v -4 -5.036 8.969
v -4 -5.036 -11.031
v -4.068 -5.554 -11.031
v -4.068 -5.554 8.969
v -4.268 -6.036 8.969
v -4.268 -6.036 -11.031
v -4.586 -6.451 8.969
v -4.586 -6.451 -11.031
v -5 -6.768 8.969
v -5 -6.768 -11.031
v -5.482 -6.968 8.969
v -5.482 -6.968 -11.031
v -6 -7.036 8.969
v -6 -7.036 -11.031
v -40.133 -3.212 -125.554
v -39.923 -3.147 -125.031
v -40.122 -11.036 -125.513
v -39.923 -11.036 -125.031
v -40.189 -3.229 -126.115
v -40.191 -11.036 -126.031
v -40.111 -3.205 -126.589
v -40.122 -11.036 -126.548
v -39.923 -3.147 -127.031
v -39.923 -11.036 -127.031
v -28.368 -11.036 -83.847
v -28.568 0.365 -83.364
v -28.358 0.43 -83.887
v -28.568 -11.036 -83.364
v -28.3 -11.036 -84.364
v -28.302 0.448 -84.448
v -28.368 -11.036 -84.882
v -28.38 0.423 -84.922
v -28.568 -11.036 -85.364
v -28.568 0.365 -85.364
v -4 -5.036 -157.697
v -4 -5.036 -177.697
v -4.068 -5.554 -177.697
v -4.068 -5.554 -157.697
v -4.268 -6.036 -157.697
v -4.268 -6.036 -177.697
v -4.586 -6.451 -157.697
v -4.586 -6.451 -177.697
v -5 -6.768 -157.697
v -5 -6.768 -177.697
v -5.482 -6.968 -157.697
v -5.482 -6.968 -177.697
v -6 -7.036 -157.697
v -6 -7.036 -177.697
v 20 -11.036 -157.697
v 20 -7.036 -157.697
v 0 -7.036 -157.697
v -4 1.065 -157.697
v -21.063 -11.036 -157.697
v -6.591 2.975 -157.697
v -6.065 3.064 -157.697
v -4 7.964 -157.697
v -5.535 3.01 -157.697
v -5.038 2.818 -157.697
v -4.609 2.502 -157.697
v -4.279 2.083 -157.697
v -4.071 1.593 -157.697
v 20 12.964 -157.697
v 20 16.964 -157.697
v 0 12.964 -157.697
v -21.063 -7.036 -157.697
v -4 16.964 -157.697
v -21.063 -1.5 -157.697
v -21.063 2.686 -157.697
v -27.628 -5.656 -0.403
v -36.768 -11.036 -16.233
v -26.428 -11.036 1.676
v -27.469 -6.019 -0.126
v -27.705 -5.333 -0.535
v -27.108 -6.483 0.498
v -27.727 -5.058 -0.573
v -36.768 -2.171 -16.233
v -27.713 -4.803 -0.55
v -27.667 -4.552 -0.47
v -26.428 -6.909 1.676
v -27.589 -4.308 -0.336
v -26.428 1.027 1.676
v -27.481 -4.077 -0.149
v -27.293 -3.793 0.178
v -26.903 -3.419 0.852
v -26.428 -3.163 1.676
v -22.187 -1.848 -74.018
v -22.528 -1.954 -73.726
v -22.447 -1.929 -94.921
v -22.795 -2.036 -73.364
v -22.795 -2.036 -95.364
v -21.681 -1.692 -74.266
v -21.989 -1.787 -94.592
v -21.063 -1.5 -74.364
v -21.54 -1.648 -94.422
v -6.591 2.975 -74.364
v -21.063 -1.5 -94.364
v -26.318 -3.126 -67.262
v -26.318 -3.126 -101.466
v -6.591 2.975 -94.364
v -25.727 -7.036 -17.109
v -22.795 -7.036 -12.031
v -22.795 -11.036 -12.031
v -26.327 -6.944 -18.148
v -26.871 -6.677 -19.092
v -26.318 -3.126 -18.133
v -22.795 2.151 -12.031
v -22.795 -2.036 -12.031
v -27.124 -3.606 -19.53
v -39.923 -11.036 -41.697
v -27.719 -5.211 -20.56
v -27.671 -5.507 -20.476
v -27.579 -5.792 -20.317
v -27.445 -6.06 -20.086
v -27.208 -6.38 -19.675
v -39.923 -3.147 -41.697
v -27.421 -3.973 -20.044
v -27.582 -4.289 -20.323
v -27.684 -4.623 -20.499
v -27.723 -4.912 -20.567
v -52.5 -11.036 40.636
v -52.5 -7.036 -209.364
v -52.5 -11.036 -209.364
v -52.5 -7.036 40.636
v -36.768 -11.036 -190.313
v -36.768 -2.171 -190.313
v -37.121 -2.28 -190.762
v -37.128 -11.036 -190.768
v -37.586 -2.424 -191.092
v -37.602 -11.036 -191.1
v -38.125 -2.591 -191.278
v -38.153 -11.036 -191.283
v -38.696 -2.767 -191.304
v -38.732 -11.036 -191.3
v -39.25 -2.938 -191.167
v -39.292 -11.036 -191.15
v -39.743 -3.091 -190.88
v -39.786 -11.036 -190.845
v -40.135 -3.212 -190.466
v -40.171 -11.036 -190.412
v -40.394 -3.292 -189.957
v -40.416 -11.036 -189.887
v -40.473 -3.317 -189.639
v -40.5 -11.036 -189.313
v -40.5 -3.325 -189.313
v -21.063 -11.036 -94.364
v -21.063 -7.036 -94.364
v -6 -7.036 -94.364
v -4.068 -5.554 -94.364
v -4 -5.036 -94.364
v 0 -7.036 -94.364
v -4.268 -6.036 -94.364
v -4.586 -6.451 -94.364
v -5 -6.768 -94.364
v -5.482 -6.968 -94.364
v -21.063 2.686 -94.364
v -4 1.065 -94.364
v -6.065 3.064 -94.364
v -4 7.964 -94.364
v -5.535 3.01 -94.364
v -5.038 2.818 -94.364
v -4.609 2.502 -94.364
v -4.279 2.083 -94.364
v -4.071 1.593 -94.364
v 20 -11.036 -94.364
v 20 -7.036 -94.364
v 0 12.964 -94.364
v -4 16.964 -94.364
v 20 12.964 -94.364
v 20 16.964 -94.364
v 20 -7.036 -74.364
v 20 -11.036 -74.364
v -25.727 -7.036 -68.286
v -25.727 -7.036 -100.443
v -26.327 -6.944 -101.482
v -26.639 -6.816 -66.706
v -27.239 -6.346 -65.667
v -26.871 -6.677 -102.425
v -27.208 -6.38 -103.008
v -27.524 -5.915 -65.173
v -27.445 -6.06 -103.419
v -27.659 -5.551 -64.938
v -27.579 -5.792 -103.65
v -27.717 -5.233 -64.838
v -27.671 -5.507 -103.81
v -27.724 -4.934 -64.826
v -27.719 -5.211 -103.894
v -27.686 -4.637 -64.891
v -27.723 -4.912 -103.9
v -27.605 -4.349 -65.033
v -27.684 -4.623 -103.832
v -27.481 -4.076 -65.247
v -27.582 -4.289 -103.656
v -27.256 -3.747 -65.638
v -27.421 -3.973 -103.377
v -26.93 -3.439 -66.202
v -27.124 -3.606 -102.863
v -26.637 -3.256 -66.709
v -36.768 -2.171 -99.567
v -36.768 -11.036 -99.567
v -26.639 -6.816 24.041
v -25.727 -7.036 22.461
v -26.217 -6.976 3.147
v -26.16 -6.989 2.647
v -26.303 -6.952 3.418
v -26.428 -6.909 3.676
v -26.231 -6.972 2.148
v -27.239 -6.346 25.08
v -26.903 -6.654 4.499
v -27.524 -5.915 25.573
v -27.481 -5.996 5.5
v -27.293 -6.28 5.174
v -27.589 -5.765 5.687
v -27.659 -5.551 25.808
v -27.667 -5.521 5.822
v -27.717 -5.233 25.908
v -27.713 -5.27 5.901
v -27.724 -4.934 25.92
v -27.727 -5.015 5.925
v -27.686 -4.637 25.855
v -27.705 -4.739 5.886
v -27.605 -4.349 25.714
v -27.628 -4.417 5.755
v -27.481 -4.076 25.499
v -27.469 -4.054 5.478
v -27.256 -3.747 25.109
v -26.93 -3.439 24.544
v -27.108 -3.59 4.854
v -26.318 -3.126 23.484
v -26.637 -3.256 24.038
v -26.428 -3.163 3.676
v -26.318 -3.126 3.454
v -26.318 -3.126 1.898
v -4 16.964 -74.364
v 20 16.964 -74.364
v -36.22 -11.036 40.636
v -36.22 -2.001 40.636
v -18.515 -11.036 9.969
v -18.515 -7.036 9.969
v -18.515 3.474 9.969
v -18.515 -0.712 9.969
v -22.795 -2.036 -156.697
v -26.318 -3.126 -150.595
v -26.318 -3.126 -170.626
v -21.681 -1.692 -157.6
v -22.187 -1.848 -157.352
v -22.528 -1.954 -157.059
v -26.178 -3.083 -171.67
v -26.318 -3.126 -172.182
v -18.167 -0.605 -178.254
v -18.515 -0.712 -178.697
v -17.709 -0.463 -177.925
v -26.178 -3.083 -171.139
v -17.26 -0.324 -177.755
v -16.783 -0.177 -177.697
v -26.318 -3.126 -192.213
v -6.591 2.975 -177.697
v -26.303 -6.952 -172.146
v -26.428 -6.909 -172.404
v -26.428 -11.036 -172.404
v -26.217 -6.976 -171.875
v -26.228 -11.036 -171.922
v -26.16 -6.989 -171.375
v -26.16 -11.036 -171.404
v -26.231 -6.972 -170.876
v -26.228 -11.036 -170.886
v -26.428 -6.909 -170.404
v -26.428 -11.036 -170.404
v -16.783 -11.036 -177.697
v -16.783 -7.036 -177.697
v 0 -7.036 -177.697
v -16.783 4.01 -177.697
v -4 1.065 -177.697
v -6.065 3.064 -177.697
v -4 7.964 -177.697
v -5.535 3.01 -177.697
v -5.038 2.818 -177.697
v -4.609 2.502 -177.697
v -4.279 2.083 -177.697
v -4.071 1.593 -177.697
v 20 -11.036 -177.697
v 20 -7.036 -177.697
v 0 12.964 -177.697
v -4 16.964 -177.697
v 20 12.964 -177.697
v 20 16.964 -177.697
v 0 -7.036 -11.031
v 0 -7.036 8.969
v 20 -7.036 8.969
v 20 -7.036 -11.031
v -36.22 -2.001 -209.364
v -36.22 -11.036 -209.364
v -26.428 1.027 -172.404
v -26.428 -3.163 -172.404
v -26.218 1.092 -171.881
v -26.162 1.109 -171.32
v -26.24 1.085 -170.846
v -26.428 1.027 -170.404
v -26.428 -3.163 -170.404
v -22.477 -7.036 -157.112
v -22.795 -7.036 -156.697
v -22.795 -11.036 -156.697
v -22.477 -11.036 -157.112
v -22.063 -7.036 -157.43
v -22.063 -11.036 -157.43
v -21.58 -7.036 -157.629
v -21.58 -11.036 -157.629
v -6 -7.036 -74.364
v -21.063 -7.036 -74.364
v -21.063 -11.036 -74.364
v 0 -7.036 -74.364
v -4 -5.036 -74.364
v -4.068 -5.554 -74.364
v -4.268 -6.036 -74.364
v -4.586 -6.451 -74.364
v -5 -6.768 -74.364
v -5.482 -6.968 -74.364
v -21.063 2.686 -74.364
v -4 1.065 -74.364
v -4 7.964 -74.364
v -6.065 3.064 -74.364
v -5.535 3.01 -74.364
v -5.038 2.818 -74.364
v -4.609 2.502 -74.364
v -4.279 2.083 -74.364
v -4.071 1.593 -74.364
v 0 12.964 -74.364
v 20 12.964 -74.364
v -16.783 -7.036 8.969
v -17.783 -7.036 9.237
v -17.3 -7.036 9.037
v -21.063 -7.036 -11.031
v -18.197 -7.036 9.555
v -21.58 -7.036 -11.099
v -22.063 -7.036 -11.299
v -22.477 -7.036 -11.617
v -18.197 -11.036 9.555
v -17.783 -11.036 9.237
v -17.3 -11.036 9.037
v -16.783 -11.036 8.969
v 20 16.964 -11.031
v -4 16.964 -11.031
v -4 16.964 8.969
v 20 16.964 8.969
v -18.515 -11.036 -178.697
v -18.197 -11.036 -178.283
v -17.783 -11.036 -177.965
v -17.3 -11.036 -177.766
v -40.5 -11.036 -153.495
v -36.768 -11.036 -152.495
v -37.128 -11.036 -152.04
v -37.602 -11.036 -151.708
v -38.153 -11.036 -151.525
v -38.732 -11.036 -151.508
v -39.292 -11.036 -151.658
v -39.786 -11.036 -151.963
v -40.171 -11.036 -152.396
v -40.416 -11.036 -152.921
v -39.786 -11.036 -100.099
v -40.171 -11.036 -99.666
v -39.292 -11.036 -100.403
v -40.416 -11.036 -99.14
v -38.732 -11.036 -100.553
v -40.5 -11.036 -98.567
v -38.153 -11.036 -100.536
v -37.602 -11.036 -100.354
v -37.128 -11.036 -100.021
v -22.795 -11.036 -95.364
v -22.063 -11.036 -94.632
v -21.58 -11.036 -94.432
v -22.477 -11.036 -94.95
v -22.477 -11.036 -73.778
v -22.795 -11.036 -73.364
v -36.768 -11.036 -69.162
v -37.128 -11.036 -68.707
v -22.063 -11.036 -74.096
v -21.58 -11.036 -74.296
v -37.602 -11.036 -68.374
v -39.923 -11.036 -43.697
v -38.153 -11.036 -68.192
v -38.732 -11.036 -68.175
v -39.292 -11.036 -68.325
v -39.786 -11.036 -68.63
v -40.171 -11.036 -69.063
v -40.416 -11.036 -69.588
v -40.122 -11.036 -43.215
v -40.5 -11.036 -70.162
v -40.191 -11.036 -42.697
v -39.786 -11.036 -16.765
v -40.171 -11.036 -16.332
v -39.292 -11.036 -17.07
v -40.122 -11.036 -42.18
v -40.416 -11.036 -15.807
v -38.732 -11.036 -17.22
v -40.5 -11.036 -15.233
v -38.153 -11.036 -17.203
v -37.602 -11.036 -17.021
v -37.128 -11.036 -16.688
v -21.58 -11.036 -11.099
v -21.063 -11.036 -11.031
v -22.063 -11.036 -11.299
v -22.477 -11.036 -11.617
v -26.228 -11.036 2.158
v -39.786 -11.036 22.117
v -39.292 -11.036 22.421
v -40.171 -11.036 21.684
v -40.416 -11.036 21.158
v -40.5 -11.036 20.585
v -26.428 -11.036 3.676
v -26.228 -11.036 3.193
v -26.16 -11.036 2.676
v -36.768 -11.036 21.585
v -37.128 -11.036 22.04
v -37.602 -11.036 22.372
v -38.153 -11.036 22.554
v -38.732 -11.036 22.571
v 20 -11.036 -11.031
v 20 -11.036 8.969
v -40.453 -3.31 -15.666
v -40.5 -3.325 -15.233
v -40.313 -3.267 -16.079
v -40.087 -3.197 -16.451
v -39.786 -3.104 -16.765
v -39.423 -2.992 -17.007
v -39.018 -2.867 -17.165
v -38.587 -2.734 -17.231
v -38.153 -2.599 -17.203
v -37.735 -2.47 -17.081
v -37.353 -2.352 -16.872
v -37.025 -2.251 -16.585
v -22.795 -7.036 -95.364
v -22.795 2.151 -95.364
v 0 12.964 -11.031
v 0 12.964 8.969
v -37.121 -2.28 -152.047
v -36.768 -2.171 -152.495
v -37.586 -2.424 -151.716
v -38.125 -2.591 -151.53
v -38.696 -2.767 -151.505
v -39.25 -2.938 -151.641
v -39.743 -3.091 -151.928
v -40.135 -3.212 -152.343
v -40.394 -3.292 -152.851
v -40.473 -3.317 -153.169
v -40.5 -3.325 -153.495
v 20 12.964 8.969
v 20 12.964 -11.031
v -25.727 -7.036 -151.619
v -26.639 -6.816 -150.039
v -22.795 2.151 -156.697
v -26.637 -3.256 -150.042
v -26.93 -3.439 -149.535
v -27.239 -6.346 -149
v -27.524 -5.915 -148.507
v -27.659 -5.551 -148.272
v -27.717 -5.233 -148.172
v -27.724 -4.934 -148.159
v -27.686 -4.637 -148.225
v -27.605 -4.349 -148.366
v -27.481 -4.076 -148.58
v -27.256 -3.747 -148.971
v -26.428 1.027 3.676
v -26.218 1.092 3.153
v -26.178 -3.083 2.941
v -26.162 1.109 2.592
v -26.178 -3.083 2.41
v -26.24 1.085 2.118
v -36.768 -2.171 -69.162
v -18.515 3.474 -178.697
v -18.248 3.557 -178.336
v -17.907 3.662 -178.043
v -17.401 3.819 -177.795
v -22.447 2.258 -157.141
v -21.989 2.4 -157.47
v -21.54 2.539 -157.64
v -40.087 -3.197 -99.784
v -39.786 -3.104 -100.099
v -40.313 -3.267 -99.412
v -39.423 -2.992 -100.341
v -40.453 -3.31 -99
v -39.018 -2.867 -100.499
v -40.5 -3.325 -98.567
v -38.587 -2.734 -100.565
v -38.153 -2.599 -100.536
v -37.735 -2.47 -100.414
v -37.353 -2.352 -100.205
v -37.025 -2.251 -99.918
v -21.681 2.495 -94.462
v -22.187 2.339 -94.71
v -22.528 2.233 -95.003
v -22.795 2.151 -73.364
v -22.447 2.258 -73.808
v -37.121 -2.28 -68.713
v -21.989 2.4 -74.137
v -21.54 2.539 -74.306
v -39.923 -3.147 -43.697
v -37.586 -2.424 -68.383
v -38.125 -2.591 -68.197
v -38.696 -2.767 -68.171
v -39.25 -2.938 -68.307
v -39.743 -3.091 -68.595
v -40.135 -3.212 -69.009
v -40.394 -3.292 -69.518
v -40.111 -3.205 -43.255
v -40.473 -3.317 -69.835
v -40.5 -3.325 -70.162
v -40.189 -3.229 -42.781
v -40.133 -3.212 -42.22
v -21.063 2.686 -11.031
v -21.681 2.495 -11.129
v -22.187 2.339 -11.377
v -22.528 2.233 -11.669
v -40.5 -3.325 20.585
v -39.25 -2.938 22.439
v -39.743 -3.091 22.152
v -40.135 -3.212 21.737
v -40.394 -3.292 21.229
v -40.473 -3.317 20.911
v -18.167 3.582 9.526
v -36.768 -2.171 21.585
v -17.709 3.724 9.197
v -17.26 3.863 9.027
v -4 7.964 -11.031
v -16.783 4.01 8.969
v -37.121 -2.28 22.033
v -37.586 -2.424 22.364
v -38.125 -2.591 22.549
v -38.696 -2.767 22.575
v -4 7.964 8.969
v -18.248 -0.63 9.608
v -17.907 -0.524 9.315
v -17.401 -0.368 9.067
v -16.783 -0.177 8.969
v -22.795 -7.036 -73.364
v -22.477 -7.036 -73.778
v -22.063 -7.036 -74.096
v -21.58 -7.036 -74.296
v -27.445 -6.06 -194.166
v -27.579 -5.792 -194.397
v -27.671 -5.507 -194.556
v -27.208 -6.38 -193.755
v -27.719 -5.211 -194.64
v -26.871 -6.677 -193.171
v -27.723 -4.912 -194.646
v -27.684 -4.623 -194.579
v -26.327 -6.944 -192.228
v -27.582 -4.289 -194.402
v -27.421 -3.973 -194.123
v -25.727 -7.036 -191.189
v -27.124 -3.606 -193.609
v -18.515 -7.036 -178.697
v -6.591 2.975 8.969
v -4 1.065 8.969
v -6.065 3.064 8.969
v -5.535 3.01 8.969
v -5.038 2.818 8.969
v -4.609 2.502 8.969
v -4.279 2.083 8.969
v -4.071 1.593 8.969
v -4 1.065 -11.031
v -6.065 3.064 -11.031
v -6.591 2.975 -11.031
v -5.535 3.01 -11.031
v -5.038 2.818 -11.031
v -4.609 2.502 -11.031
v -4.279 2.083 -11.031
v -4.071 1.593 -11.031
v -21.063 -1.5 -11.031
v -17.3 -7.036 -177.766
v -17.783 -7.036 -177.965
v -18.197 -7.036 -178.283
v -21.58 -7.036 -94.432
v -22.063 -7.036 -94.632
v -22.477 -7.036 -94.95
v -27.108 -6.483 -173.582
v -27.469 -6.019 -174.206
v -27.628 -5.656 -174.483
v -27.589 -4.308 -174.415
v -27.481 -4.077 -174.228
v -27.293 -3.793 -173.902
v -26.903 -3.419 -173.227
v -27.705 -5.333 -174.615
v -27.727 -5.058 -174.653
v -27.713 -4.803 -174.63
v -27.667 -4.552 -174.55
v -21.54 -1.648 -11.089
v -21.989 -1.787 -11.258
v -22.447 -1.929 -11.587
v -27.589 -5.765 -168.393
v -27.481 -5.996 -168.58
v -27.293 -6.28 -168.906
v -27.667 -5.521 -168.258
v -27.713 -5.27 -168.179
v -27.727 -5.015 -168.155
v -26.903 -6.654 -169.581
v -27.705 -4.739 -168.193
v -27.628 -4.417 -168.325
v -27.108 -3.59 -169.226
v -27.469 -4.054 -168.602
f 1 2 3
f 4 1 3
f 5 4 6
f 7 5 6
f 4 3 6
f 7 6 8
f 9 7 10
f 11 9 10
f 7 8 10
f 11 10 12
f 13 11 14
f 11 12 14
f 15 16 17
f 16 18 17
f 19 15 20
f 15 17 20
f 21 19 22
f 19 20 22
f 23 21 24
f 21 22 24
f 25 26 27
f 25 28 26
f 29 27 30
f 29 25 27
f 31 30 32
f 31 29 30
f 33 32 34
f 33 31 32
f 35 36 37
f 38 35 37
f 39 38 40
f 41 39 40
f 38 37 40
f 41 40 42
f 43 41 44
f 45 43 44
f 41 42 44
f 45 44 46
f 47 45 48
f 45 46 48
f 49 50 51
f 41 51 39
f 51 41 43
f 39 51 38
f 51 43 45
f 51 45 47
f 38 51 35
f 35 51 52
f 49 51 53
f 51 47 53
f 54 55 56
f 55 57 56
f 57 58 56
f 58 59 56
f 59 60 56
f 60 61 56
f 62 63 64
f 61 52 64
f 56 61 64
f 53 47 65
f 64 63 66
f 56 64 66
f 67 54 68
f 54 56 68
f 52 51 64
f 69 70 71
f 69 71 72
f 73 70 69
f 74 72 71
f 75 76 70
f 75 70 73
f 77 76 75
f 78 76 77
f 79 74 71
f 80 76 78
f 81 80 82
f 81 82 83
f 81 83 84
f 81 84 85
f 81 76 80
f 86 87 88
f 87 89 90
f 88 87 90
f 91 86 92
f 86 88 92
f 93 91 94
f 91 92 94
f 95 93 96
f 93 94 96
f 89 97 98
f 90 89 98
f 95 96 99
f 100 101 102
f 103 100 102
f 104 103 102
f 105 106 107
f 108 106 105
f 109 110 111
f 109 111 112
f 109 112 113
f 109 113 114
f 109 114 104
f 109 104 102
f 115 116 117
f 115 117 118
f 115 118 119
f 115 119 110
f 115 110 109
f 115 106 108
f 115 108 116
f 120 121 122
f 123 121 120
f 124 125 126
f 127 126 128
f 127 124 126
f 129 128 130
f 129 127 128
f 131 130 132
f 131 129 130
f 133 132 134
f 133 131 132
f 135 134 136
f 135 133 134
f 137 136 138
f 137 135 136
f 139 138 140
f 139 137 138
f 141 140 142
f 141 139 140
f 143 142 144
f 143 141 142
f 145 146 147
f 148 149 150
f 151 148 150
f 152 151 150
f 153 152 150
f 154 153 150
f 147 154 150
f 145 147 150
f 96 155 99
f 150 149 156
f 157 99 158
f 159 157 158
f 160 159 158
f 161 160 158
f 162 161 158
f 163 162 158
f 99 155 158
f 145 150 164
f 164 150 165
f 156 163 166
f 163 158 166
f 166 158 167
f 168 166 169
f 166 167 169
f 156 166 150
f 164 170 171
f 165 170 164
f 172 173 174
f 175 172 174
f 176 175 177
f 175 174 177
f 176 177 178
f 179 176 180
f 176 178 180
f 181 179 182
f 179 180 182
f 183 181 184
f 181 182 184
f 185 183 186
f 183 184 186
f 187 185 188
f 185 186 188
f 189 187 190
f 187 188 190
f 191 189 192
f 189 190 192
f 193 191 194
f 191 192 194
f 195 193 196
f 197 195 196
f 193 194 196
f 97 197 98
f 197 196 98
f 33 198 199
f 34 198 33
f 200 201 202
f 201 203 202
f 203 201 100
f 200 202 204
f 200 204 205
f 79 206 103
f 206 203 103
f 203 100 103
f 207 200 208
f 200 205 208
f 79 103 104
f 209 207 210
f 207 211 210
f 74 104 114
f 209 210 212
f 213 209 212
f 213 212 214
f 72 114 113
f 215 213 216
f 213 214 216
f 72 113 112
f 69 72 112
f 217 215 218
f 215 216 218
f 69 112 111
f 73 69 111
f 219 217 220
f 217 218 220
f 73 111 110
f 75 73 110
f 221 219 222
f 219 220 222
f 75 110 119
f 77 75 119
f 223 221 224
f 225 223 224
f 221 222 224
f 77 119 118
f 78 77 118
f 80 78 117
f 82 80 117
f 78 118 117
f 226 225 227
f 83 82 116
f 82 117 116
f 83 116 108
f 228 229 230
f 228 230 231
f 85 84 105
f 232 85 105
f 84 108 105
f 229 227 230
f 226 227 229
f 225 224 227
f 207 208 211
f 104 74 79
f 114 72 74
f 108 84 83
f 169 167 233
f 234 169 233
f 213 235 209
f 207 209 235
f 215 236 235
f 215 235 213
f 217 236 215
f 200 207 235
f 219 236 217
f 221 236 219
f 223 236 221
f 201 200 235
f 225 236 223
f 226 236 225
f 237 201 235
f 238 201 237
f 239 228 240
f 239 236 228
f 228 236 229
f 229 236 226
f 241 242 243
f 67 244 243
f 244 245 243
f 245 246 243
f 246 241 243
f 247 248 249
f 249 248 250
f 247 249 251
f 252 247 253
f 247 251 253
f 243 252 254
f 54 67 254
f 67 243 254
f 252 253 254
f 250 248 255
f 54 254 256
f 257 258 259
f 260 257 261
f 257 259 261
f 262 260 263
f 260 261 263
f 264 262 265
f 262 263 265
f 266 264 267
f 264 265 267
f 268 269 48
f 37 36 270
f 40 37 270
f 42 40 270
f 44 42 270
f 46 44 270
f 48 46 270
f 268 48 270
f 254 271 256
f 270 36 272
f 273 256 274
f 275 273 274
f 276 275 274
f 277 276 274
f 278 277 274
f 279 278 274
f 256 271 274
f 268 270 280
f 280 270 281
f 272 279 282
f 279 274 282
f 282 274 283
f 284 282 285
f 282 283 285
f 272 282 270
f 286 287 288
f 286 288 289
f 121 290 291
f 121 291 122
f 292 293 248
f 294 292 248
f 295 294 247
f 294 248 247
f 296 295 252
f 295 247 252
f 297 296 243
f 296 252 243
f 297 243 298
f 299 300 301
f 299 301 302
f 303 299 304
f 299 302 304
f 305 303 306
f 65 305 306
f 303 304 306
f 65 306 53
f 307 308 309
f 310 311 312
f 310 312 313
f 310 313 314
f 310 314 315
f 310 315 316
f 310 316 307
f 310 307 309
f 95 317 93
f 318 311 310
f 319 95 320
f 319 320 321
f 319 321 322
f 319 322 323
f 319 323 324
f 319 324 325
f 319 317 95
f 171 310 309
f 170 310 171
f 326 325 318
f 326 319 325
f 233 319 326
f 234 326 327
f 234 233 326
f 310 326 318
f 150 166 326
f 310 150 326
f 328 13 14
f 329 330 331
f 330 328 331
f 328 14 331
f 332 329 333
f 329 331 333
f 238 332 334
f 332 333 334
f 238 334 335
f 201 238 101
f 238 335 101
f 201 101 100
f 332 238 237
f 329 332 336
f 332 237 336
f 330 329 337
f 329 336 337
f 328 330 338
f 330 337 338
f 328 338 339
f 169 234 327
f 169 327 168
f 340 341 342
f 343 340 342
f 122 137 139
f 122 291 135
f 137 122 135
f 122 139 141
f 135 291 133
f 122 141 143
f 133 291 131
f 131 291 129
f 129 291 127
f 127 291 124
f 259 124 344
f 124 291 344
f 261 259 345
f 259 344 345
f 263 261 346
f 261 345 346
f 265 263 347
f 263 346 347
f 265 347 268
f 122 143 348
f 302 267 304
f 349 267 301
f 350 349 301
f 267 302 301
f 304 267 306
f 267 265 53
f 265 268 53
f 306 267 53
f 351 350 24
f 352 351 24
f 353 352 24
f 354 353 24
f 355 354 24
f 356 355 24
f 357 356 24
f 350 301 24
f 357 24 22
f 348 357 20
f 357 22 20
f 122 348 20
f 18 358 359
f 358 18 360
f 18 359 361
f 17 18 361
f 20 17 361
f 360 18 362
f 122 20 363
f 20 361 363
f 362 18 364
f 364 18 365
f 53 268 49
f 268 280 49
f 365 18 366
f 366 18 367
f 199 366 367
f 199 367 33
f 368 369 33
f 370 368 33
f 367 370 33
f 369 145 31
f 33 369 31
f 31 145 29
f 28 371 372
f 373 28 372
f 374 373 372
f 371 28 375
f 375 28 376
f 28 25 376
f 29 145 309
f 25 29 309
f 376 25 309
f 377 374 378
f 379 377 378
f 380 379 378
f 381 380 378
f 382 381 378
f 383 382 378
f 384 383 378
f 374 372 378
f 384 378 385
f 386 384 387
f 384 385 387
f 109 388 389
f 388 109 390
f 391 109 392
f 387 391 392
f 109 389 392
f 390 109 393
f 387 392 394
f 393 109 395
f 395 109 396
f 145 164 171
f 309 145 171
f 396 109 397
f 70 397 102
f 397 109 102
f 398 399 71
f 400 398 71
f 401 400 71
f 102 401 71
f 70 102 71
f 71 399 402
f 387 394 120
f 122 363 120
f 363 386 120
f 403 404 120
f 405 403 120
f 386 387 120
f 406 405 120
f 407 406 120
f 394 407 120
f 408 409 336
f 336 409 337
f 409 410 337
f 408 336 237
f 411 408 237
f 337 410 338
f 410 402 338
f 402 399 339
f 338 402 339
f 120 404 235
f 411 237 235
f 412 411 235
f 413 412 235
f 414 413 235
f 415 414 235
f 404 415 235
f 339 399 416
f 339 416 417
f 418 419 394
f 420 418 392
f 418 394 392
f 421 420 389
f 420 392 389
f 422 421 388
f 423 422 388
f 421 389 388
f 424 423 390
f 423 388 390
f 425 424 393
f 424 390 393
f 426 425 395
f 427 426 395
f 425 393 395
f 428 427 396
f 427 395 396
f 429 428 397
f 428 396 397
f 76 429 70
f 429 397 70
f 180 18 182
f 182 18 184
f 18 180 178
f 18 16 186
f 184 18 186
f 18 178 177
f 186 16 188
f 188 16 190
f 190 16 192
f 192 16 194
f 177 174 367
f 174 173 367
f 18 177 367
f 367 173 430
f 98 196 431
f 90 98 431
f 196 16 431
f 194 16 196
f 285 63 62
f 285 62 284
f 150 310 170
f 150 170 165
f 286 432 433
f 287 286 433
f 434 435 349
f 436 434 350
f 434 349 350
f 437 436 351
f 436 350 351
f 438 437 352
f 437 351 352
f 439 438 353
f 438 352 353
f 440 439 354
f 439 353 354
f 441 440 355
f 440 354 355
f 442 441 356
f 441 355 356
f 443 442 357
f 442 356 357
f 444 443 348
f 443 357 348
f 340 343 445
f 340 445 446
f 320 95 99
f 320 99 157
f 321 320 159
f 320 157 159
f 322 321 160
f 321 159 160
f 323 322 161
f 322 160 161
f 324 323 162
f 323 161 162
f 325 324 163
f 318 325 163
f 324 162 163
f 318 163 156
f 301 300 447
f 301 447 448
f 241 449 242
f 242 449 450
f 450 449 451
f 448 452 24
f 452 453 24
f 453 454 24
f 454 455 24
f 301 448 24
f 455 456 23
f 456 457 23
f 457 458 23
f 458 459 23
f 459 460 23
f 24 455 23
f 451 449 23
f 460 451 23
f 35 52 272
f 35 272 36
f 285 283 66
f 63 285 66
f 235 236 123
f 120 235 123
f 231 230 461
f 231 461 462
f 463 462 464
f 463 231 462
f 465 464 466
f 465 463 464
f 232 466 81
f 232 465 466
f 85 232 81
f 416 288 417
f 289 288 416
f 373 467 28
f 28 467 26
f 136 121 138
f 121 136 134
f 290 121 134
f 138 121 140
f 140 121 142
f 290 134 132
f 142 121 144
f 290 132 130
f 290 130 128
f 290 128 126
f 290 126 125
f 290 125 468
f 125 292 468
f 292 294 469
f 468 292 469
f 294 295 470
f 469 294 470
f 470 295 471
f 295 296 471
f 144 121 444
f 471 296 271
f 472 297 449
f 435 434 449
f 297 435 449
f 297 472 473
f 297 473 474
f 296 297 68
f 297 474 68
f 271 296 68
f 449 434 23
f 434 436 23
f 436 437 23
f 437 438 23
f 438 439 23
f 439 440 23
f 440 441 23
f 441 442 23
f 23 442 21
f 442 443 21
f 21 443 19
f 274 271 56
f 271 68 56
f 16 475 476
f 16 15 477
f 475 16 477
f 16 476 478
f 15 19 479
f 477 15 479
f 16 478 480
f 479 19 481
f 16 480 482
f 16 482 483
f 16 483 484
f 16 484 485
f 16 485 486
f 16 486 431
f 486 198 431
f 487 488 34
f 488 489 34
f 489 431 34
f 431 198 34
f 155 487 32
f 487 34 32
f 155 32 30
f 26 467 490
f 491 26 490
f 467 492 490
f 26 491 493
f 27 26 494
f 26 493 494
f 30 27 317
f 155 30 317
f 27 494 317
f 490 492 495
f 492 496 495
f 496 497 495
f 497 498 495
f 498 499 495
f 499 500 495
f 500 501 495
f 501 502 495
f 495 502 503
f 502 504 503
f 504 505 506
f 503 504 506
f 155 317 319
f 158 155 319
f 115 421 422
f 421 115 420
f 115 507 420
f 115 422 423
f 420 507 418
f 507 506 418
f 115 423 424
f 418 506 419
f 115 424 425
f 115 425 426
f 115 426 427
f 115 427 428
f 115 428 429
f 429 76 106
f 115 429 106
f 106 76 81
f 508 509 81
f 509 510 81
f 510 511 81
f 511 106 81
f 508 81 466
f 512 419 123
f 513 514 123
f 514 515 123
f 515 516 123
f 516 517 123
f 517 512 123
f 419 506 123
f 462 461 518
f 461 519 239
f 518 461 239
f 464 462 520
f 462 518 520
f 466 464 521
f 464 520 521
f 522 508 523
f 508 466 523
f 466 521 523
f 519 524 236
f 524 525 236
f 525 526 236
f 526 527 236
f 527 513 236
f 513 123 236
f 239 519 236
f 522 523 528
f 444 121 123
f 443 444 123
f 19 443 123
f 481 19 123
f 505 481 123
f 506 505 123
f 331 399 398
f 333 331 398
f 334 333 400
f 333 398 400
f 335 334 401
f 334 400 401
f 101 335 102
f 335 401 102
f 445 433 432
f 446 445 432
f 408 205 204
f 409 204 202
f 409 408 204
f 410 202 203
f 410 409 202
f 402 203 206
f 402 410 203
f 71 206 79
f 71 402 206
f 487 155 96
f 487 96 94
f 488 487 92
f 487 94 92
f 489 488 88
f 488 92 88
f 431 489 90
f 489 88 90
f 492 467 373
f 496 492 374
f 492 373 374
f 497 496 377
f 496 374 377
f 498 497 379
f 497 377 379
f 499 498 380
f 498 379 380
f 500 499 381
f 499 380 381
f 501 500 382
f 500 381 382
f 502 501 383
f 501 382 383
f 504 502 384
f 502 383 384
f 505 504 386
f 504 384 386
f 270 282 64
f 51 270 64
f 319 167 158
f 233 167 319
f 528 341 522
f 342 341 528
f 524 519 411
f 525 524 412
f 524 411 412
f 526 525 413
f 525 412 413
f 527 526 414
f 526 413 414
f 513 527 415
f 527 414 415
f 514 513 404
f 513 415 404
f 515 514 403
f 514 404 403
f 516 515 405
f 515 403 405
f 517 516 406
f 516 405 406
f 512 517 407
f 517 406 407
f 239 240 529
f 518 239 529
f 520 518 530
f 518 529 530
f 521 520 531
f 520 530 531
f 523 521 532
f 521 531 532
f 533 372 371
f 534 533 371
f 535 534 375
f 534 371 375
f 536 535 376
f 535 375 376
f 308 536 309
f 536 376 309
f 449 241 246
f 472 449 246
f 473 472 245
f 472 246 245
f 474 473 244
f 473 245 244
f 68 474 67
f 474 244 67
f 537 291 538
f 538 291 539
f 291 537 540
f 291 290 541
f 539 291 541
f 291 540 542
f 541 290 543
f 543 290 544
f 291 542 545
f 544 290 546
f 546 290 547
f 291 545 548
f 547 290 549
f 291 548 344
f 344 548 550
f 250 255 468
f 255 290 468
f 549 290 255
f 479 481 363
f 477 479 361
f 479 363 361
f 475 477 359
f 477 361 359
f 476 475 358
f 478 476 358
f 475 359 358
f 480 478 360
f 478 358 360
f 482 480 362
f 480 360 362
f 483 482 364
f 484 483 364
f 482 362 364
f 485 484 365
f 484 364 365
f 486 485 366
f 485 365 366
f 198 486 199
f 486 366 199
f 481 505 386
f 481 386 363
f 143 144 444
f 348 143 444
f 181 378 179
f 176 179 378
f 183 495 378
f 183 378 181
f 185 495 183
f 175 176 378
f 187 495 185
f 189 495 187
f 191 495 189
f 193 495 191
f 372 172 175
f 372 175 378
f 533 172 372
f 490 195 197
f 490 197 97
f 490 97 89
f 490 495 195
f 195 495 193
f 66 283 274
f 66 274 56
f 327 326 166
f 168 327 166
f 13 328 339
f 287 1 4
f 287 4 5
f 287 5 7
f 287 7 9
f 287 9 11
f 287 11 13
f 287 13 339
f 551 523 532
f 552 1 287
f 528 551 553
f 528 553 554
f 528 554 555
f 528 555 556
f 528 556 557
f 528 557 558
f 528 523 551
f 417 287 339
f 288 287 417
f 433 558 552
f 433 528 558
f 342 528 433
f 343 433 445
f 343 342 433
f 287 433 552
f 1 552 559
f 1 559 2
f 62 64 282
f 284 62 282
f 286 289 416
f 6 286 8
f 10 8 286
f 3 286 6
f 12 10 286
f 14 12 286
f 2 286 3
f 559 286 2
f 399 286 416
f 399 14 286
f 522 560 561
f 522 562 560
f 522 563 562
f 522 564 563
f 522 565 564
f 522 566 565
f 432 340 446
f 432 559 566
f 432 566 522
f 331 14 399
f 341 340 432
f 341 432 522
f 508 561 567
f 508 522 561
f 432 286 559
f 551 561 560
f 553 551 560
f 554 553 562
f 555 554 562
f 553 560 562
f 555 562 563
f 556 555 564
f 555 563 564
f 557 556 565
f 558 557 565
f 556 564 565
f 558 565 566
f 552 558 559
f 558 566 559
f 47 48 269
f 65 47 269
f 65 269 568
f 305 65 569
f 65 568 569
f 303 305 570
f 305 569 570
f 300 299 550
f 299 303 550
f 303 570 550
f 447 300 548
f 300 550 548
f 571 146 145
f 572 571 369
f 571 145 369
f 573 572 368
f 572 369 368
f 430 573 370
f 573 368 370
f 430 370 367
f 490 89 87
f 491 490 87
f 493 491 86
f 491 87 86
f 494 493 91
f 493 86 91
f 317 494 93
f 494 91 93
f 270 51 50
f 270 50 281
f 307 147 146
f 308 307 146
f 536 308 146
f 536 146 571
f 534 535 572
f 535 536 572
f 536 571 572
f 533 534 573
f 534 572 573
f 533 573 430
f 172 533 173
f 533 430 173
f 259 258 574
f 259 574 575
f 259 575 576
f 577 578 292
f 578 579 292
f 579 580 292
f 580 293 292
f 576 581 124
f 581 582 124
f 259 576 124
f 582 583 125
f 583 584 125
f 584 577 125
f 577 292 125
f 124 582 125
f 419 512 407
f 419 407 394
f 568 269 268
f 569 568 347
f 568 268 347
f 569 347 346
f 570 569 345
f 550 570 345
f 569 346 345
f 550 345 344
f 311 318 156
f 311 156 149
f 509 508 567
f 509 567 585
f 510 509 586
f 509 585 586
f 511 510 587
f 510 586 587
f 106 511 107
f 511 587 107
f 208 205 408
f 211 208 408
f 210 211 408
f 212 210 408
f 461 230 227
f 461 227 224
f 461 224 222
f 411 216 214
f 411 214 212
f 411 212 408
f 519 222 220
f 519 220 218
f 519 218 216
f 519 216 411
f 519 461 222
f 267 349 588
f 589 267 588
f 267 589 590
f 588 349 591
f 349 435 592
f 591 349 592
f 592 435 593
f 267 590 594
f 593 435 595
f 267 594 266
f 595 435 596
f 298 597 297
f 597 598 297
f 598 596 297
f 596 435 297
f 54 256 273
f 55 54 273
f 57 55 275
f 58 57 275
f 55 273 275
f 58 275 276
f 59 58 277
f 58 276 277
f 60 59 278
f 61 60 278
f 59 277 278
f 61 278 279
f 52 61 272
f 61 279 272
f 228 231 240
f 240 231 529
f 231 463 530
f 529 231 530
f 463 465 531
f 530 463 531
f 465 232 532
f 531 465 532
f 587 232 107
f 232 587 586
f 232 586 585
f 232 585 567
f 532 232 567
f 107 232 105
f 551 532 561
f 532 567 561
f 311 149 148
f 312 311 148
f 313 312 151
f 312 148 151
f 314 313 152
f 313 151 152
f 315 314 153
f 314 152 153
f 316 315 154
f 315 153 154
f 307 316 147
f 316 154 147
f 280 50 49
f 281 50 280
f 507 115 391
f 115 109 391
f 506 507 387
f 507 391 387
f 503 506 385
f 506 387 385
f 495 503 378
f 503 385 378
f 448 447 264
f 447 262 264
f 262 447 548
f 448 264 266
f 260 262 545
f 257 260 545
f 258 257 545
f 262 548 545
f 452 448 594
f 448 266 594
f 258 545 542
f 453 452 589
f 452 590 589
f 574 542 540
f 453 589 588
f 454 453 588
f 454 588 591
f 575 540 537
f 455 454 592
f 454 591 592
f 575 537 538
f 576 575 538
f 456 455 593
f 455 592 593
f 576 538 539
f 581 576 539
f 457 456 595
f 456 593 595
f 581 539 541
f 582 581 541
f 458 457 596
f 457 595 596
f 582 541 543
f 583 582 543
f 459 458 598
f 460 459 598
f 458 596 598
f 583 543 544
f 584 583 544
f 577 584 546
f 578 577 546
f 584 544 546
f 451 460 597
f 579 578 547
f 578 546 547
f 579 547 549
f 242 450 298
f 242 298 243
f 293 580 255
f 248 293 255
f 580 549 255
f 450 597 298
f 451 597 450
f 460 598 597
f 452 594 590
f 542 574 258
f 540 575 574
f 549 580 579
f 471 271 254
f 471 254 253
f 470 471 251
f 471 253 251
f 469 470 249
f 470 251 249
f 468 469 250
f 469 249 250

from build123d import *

# Parameters (mm, degrees)
SKETCH_1_W          = 250
SKETCH_1_H          = 4
EXTRUDE_1_DEPTH     = 20
EXTRUDE_1_2_DEPTH   = 20
SKETCH_2_W          = 250
SKETCH_2_H          = 28
EXTRUDE_2_DEPTH     = 4
SKETCH_3_W          = 250
SKETCH_3_H          = 4
EXTRUDE_3_DEPTH     = 48.5
EXTRUDE_4_DEPTH     = 250
CUT_EXTRUDE_1_DEPTH = 55
FILLET_1_R          = 2
CUT_EXTRUDE_2_DEPTH = 250


with BuildPart() as part:
    # 草图1 → 凸台-拉伸1 (new body)
    with BuildSketch(Plane(origin=(0, 0, 0), x_dir=(0, 0, -1), z_dir=(1, 0, 0))):
        with Locations((84.36416185, 14.963552055)):
            Rectangle(SKETCH_1_W, SKETCH_1_H)
    extrude(amount=EXTRUDE_1_DEPTH)



with BuildPart() as body_2:
    # 草图1 → Extrude 1 2 (new body)
    with BuildSketch(Plane(origin=(0, 0, 0), x_dir=(0, 0, -1), z_dir=(1, 0, 0))):
        with Locations((84.36416185, -9.036447945)):
            Rectangle(SKETCH_1_W, SKETCH_1_H)
    extrude(amount=EXTRUDE_1_2_DEPTH)


with BuildPart() as part_1:
    add(part.part)

    add(body_2.part)  # 凸台-拉伸2 merges body 2
    # 草图2 → 凸台-拉伸2 (add)
    with BuildSketch(Plane.ZY):
        with Locations((-84.36416185, 2.963552055)):
            Rectangle(SKETCH_2_W, SKETCH_2_H)
    extrude(amount=EXTRUDE_2_DEPTH)

    # 草图3 → 凸台-拉伸3 (add)
    with BuildSketch(Plane.ZY.offset(4)):
        with Locations((-84.36416185, -9.036447945)):
            Rectangle(SKETCH_3_W, SKETCH_3_H)
    extrude(amount=EXTRUDE_3_DEPTH)

    # 草图5 → 凸台-拉伸4 (add)
    with BuildSketch(Plane.XY.offset(40.63583815)):
        Polygon((-4, -7.036447945), (-52.5, -7.036447945), (-4, 7.963552055), align=None)
    extrude(amount=-EXTRUDE_4_DEPTH)

    # 草图7 → 切除-拉伸1 (cut)
    with BuildSketch(Plane(origin=(0, 16.963552055, 0), x_dir=(1, 0, 0), z_dir=(0, 1, 0))):
        Polygon((-36.220043801, 209.36416185), (-17.937285277, 177.697495183), (20, 177.697495183), (20, 209.36416185), align=None)
        Polygon((20, 157.697495183), (-22.217241476, 157.697495183), (-40.5, 126.030828516), (-22.217241476, 94.36416185), (20, 94.36416185), align=None)
        Polygon((-40.5, 196.77726344), (-40.5, 146.030828516), (-25.850766068, 171.404045978), align=None)
        Polygon((-40.5, 106.030828516), (-27.990744168, 84.36416185), (-40.5, 84.36416185), align=None)
    cut_extrude_1 = extrude(amount=-CUT_EXTRUDE_1_DEPTH, mode=Mode.SUBTRACT)

    # 镜向1: 切除-拉伸1 across plane
    add(cut_extrude_1.mirror(Plane(origin=(0, 0, -84.36416185), x_dir=(1, 0, 0), z_dir=(0, 0, -1))), mode=Mode.SUBTRACT)

    # 圆角1
    fillet_1_edges = [part_1.edges().sort_by_distance(p)[0] for p in [
        (-22.217241476, -4.353547142, -94.36416185),
        (-40.5, -7.180777842, -126.030828516),
        (-22.217241476, -4.353547142, -157.697495183),
        (-40.5, -7.180777842, -106.030828516),
        (-27.990744168, -5.246356837, -84.36416185),
        (-17.937285277, -3.691698245, -177.697495183),
        (-25.850766068, -4.915432388, 2.675722279),
        (-40.5, -7.180777842, 28.048939741),
        (-40.5, -7.180777842, -22.697495183),
        (-22.217241476, -4.353547142, -11.030828516),
        (-40.5, -7.180777842, -42.697495183),
        (-22.217241476, -4.353547142, -74.36416185),
        (-40.5, -7.180777842, -62.697495183),
        (-17.937285277, -3.691698245, 8.969171484),
        (-40.5, -7.180777842, -196.77726344),
        (-25.850766068, -4.915432388, -171.404045978),
        (-40.5, -7.180777842, -146.030828516),
    ]]
    fillet(fillet_1_edges, radius=FILLET_1_R)

    # 草图8 → 切除-拉伸2 (cut)
    with BuildSketch(Plane(origin=(0, 0, -209.36416185), x_dir=(-1, 0, 0), z_dir=(0, 0, -1))):
        with BuildLine():
            Line((4, 1.064588398), (4, -5.036447945))
            ThreePointArc((4, -5.036447945), (4.585786438, -6.450661507), (6, -7.036447945))
            Line((6, -7.036447945), (25.726684176, -7.036447945))
            ThreePointArc((25.726684176, -7.036447945), (27.704234228, -5.33527196), (26.317623622, -3.125743737))
            Line((26.317623622, -3.125743737), (6.590939446, 2.975292607))
            ThreePointArc((6.590939446, 2.975292607), (4.812961435, 2.674227937), (4, 1.064588398))
        make_face()
    extrude(amount=-CUT_EXTRUDE_2_DEPTH, mode=Mode.SUBTRACT)


solid = part_1.part
